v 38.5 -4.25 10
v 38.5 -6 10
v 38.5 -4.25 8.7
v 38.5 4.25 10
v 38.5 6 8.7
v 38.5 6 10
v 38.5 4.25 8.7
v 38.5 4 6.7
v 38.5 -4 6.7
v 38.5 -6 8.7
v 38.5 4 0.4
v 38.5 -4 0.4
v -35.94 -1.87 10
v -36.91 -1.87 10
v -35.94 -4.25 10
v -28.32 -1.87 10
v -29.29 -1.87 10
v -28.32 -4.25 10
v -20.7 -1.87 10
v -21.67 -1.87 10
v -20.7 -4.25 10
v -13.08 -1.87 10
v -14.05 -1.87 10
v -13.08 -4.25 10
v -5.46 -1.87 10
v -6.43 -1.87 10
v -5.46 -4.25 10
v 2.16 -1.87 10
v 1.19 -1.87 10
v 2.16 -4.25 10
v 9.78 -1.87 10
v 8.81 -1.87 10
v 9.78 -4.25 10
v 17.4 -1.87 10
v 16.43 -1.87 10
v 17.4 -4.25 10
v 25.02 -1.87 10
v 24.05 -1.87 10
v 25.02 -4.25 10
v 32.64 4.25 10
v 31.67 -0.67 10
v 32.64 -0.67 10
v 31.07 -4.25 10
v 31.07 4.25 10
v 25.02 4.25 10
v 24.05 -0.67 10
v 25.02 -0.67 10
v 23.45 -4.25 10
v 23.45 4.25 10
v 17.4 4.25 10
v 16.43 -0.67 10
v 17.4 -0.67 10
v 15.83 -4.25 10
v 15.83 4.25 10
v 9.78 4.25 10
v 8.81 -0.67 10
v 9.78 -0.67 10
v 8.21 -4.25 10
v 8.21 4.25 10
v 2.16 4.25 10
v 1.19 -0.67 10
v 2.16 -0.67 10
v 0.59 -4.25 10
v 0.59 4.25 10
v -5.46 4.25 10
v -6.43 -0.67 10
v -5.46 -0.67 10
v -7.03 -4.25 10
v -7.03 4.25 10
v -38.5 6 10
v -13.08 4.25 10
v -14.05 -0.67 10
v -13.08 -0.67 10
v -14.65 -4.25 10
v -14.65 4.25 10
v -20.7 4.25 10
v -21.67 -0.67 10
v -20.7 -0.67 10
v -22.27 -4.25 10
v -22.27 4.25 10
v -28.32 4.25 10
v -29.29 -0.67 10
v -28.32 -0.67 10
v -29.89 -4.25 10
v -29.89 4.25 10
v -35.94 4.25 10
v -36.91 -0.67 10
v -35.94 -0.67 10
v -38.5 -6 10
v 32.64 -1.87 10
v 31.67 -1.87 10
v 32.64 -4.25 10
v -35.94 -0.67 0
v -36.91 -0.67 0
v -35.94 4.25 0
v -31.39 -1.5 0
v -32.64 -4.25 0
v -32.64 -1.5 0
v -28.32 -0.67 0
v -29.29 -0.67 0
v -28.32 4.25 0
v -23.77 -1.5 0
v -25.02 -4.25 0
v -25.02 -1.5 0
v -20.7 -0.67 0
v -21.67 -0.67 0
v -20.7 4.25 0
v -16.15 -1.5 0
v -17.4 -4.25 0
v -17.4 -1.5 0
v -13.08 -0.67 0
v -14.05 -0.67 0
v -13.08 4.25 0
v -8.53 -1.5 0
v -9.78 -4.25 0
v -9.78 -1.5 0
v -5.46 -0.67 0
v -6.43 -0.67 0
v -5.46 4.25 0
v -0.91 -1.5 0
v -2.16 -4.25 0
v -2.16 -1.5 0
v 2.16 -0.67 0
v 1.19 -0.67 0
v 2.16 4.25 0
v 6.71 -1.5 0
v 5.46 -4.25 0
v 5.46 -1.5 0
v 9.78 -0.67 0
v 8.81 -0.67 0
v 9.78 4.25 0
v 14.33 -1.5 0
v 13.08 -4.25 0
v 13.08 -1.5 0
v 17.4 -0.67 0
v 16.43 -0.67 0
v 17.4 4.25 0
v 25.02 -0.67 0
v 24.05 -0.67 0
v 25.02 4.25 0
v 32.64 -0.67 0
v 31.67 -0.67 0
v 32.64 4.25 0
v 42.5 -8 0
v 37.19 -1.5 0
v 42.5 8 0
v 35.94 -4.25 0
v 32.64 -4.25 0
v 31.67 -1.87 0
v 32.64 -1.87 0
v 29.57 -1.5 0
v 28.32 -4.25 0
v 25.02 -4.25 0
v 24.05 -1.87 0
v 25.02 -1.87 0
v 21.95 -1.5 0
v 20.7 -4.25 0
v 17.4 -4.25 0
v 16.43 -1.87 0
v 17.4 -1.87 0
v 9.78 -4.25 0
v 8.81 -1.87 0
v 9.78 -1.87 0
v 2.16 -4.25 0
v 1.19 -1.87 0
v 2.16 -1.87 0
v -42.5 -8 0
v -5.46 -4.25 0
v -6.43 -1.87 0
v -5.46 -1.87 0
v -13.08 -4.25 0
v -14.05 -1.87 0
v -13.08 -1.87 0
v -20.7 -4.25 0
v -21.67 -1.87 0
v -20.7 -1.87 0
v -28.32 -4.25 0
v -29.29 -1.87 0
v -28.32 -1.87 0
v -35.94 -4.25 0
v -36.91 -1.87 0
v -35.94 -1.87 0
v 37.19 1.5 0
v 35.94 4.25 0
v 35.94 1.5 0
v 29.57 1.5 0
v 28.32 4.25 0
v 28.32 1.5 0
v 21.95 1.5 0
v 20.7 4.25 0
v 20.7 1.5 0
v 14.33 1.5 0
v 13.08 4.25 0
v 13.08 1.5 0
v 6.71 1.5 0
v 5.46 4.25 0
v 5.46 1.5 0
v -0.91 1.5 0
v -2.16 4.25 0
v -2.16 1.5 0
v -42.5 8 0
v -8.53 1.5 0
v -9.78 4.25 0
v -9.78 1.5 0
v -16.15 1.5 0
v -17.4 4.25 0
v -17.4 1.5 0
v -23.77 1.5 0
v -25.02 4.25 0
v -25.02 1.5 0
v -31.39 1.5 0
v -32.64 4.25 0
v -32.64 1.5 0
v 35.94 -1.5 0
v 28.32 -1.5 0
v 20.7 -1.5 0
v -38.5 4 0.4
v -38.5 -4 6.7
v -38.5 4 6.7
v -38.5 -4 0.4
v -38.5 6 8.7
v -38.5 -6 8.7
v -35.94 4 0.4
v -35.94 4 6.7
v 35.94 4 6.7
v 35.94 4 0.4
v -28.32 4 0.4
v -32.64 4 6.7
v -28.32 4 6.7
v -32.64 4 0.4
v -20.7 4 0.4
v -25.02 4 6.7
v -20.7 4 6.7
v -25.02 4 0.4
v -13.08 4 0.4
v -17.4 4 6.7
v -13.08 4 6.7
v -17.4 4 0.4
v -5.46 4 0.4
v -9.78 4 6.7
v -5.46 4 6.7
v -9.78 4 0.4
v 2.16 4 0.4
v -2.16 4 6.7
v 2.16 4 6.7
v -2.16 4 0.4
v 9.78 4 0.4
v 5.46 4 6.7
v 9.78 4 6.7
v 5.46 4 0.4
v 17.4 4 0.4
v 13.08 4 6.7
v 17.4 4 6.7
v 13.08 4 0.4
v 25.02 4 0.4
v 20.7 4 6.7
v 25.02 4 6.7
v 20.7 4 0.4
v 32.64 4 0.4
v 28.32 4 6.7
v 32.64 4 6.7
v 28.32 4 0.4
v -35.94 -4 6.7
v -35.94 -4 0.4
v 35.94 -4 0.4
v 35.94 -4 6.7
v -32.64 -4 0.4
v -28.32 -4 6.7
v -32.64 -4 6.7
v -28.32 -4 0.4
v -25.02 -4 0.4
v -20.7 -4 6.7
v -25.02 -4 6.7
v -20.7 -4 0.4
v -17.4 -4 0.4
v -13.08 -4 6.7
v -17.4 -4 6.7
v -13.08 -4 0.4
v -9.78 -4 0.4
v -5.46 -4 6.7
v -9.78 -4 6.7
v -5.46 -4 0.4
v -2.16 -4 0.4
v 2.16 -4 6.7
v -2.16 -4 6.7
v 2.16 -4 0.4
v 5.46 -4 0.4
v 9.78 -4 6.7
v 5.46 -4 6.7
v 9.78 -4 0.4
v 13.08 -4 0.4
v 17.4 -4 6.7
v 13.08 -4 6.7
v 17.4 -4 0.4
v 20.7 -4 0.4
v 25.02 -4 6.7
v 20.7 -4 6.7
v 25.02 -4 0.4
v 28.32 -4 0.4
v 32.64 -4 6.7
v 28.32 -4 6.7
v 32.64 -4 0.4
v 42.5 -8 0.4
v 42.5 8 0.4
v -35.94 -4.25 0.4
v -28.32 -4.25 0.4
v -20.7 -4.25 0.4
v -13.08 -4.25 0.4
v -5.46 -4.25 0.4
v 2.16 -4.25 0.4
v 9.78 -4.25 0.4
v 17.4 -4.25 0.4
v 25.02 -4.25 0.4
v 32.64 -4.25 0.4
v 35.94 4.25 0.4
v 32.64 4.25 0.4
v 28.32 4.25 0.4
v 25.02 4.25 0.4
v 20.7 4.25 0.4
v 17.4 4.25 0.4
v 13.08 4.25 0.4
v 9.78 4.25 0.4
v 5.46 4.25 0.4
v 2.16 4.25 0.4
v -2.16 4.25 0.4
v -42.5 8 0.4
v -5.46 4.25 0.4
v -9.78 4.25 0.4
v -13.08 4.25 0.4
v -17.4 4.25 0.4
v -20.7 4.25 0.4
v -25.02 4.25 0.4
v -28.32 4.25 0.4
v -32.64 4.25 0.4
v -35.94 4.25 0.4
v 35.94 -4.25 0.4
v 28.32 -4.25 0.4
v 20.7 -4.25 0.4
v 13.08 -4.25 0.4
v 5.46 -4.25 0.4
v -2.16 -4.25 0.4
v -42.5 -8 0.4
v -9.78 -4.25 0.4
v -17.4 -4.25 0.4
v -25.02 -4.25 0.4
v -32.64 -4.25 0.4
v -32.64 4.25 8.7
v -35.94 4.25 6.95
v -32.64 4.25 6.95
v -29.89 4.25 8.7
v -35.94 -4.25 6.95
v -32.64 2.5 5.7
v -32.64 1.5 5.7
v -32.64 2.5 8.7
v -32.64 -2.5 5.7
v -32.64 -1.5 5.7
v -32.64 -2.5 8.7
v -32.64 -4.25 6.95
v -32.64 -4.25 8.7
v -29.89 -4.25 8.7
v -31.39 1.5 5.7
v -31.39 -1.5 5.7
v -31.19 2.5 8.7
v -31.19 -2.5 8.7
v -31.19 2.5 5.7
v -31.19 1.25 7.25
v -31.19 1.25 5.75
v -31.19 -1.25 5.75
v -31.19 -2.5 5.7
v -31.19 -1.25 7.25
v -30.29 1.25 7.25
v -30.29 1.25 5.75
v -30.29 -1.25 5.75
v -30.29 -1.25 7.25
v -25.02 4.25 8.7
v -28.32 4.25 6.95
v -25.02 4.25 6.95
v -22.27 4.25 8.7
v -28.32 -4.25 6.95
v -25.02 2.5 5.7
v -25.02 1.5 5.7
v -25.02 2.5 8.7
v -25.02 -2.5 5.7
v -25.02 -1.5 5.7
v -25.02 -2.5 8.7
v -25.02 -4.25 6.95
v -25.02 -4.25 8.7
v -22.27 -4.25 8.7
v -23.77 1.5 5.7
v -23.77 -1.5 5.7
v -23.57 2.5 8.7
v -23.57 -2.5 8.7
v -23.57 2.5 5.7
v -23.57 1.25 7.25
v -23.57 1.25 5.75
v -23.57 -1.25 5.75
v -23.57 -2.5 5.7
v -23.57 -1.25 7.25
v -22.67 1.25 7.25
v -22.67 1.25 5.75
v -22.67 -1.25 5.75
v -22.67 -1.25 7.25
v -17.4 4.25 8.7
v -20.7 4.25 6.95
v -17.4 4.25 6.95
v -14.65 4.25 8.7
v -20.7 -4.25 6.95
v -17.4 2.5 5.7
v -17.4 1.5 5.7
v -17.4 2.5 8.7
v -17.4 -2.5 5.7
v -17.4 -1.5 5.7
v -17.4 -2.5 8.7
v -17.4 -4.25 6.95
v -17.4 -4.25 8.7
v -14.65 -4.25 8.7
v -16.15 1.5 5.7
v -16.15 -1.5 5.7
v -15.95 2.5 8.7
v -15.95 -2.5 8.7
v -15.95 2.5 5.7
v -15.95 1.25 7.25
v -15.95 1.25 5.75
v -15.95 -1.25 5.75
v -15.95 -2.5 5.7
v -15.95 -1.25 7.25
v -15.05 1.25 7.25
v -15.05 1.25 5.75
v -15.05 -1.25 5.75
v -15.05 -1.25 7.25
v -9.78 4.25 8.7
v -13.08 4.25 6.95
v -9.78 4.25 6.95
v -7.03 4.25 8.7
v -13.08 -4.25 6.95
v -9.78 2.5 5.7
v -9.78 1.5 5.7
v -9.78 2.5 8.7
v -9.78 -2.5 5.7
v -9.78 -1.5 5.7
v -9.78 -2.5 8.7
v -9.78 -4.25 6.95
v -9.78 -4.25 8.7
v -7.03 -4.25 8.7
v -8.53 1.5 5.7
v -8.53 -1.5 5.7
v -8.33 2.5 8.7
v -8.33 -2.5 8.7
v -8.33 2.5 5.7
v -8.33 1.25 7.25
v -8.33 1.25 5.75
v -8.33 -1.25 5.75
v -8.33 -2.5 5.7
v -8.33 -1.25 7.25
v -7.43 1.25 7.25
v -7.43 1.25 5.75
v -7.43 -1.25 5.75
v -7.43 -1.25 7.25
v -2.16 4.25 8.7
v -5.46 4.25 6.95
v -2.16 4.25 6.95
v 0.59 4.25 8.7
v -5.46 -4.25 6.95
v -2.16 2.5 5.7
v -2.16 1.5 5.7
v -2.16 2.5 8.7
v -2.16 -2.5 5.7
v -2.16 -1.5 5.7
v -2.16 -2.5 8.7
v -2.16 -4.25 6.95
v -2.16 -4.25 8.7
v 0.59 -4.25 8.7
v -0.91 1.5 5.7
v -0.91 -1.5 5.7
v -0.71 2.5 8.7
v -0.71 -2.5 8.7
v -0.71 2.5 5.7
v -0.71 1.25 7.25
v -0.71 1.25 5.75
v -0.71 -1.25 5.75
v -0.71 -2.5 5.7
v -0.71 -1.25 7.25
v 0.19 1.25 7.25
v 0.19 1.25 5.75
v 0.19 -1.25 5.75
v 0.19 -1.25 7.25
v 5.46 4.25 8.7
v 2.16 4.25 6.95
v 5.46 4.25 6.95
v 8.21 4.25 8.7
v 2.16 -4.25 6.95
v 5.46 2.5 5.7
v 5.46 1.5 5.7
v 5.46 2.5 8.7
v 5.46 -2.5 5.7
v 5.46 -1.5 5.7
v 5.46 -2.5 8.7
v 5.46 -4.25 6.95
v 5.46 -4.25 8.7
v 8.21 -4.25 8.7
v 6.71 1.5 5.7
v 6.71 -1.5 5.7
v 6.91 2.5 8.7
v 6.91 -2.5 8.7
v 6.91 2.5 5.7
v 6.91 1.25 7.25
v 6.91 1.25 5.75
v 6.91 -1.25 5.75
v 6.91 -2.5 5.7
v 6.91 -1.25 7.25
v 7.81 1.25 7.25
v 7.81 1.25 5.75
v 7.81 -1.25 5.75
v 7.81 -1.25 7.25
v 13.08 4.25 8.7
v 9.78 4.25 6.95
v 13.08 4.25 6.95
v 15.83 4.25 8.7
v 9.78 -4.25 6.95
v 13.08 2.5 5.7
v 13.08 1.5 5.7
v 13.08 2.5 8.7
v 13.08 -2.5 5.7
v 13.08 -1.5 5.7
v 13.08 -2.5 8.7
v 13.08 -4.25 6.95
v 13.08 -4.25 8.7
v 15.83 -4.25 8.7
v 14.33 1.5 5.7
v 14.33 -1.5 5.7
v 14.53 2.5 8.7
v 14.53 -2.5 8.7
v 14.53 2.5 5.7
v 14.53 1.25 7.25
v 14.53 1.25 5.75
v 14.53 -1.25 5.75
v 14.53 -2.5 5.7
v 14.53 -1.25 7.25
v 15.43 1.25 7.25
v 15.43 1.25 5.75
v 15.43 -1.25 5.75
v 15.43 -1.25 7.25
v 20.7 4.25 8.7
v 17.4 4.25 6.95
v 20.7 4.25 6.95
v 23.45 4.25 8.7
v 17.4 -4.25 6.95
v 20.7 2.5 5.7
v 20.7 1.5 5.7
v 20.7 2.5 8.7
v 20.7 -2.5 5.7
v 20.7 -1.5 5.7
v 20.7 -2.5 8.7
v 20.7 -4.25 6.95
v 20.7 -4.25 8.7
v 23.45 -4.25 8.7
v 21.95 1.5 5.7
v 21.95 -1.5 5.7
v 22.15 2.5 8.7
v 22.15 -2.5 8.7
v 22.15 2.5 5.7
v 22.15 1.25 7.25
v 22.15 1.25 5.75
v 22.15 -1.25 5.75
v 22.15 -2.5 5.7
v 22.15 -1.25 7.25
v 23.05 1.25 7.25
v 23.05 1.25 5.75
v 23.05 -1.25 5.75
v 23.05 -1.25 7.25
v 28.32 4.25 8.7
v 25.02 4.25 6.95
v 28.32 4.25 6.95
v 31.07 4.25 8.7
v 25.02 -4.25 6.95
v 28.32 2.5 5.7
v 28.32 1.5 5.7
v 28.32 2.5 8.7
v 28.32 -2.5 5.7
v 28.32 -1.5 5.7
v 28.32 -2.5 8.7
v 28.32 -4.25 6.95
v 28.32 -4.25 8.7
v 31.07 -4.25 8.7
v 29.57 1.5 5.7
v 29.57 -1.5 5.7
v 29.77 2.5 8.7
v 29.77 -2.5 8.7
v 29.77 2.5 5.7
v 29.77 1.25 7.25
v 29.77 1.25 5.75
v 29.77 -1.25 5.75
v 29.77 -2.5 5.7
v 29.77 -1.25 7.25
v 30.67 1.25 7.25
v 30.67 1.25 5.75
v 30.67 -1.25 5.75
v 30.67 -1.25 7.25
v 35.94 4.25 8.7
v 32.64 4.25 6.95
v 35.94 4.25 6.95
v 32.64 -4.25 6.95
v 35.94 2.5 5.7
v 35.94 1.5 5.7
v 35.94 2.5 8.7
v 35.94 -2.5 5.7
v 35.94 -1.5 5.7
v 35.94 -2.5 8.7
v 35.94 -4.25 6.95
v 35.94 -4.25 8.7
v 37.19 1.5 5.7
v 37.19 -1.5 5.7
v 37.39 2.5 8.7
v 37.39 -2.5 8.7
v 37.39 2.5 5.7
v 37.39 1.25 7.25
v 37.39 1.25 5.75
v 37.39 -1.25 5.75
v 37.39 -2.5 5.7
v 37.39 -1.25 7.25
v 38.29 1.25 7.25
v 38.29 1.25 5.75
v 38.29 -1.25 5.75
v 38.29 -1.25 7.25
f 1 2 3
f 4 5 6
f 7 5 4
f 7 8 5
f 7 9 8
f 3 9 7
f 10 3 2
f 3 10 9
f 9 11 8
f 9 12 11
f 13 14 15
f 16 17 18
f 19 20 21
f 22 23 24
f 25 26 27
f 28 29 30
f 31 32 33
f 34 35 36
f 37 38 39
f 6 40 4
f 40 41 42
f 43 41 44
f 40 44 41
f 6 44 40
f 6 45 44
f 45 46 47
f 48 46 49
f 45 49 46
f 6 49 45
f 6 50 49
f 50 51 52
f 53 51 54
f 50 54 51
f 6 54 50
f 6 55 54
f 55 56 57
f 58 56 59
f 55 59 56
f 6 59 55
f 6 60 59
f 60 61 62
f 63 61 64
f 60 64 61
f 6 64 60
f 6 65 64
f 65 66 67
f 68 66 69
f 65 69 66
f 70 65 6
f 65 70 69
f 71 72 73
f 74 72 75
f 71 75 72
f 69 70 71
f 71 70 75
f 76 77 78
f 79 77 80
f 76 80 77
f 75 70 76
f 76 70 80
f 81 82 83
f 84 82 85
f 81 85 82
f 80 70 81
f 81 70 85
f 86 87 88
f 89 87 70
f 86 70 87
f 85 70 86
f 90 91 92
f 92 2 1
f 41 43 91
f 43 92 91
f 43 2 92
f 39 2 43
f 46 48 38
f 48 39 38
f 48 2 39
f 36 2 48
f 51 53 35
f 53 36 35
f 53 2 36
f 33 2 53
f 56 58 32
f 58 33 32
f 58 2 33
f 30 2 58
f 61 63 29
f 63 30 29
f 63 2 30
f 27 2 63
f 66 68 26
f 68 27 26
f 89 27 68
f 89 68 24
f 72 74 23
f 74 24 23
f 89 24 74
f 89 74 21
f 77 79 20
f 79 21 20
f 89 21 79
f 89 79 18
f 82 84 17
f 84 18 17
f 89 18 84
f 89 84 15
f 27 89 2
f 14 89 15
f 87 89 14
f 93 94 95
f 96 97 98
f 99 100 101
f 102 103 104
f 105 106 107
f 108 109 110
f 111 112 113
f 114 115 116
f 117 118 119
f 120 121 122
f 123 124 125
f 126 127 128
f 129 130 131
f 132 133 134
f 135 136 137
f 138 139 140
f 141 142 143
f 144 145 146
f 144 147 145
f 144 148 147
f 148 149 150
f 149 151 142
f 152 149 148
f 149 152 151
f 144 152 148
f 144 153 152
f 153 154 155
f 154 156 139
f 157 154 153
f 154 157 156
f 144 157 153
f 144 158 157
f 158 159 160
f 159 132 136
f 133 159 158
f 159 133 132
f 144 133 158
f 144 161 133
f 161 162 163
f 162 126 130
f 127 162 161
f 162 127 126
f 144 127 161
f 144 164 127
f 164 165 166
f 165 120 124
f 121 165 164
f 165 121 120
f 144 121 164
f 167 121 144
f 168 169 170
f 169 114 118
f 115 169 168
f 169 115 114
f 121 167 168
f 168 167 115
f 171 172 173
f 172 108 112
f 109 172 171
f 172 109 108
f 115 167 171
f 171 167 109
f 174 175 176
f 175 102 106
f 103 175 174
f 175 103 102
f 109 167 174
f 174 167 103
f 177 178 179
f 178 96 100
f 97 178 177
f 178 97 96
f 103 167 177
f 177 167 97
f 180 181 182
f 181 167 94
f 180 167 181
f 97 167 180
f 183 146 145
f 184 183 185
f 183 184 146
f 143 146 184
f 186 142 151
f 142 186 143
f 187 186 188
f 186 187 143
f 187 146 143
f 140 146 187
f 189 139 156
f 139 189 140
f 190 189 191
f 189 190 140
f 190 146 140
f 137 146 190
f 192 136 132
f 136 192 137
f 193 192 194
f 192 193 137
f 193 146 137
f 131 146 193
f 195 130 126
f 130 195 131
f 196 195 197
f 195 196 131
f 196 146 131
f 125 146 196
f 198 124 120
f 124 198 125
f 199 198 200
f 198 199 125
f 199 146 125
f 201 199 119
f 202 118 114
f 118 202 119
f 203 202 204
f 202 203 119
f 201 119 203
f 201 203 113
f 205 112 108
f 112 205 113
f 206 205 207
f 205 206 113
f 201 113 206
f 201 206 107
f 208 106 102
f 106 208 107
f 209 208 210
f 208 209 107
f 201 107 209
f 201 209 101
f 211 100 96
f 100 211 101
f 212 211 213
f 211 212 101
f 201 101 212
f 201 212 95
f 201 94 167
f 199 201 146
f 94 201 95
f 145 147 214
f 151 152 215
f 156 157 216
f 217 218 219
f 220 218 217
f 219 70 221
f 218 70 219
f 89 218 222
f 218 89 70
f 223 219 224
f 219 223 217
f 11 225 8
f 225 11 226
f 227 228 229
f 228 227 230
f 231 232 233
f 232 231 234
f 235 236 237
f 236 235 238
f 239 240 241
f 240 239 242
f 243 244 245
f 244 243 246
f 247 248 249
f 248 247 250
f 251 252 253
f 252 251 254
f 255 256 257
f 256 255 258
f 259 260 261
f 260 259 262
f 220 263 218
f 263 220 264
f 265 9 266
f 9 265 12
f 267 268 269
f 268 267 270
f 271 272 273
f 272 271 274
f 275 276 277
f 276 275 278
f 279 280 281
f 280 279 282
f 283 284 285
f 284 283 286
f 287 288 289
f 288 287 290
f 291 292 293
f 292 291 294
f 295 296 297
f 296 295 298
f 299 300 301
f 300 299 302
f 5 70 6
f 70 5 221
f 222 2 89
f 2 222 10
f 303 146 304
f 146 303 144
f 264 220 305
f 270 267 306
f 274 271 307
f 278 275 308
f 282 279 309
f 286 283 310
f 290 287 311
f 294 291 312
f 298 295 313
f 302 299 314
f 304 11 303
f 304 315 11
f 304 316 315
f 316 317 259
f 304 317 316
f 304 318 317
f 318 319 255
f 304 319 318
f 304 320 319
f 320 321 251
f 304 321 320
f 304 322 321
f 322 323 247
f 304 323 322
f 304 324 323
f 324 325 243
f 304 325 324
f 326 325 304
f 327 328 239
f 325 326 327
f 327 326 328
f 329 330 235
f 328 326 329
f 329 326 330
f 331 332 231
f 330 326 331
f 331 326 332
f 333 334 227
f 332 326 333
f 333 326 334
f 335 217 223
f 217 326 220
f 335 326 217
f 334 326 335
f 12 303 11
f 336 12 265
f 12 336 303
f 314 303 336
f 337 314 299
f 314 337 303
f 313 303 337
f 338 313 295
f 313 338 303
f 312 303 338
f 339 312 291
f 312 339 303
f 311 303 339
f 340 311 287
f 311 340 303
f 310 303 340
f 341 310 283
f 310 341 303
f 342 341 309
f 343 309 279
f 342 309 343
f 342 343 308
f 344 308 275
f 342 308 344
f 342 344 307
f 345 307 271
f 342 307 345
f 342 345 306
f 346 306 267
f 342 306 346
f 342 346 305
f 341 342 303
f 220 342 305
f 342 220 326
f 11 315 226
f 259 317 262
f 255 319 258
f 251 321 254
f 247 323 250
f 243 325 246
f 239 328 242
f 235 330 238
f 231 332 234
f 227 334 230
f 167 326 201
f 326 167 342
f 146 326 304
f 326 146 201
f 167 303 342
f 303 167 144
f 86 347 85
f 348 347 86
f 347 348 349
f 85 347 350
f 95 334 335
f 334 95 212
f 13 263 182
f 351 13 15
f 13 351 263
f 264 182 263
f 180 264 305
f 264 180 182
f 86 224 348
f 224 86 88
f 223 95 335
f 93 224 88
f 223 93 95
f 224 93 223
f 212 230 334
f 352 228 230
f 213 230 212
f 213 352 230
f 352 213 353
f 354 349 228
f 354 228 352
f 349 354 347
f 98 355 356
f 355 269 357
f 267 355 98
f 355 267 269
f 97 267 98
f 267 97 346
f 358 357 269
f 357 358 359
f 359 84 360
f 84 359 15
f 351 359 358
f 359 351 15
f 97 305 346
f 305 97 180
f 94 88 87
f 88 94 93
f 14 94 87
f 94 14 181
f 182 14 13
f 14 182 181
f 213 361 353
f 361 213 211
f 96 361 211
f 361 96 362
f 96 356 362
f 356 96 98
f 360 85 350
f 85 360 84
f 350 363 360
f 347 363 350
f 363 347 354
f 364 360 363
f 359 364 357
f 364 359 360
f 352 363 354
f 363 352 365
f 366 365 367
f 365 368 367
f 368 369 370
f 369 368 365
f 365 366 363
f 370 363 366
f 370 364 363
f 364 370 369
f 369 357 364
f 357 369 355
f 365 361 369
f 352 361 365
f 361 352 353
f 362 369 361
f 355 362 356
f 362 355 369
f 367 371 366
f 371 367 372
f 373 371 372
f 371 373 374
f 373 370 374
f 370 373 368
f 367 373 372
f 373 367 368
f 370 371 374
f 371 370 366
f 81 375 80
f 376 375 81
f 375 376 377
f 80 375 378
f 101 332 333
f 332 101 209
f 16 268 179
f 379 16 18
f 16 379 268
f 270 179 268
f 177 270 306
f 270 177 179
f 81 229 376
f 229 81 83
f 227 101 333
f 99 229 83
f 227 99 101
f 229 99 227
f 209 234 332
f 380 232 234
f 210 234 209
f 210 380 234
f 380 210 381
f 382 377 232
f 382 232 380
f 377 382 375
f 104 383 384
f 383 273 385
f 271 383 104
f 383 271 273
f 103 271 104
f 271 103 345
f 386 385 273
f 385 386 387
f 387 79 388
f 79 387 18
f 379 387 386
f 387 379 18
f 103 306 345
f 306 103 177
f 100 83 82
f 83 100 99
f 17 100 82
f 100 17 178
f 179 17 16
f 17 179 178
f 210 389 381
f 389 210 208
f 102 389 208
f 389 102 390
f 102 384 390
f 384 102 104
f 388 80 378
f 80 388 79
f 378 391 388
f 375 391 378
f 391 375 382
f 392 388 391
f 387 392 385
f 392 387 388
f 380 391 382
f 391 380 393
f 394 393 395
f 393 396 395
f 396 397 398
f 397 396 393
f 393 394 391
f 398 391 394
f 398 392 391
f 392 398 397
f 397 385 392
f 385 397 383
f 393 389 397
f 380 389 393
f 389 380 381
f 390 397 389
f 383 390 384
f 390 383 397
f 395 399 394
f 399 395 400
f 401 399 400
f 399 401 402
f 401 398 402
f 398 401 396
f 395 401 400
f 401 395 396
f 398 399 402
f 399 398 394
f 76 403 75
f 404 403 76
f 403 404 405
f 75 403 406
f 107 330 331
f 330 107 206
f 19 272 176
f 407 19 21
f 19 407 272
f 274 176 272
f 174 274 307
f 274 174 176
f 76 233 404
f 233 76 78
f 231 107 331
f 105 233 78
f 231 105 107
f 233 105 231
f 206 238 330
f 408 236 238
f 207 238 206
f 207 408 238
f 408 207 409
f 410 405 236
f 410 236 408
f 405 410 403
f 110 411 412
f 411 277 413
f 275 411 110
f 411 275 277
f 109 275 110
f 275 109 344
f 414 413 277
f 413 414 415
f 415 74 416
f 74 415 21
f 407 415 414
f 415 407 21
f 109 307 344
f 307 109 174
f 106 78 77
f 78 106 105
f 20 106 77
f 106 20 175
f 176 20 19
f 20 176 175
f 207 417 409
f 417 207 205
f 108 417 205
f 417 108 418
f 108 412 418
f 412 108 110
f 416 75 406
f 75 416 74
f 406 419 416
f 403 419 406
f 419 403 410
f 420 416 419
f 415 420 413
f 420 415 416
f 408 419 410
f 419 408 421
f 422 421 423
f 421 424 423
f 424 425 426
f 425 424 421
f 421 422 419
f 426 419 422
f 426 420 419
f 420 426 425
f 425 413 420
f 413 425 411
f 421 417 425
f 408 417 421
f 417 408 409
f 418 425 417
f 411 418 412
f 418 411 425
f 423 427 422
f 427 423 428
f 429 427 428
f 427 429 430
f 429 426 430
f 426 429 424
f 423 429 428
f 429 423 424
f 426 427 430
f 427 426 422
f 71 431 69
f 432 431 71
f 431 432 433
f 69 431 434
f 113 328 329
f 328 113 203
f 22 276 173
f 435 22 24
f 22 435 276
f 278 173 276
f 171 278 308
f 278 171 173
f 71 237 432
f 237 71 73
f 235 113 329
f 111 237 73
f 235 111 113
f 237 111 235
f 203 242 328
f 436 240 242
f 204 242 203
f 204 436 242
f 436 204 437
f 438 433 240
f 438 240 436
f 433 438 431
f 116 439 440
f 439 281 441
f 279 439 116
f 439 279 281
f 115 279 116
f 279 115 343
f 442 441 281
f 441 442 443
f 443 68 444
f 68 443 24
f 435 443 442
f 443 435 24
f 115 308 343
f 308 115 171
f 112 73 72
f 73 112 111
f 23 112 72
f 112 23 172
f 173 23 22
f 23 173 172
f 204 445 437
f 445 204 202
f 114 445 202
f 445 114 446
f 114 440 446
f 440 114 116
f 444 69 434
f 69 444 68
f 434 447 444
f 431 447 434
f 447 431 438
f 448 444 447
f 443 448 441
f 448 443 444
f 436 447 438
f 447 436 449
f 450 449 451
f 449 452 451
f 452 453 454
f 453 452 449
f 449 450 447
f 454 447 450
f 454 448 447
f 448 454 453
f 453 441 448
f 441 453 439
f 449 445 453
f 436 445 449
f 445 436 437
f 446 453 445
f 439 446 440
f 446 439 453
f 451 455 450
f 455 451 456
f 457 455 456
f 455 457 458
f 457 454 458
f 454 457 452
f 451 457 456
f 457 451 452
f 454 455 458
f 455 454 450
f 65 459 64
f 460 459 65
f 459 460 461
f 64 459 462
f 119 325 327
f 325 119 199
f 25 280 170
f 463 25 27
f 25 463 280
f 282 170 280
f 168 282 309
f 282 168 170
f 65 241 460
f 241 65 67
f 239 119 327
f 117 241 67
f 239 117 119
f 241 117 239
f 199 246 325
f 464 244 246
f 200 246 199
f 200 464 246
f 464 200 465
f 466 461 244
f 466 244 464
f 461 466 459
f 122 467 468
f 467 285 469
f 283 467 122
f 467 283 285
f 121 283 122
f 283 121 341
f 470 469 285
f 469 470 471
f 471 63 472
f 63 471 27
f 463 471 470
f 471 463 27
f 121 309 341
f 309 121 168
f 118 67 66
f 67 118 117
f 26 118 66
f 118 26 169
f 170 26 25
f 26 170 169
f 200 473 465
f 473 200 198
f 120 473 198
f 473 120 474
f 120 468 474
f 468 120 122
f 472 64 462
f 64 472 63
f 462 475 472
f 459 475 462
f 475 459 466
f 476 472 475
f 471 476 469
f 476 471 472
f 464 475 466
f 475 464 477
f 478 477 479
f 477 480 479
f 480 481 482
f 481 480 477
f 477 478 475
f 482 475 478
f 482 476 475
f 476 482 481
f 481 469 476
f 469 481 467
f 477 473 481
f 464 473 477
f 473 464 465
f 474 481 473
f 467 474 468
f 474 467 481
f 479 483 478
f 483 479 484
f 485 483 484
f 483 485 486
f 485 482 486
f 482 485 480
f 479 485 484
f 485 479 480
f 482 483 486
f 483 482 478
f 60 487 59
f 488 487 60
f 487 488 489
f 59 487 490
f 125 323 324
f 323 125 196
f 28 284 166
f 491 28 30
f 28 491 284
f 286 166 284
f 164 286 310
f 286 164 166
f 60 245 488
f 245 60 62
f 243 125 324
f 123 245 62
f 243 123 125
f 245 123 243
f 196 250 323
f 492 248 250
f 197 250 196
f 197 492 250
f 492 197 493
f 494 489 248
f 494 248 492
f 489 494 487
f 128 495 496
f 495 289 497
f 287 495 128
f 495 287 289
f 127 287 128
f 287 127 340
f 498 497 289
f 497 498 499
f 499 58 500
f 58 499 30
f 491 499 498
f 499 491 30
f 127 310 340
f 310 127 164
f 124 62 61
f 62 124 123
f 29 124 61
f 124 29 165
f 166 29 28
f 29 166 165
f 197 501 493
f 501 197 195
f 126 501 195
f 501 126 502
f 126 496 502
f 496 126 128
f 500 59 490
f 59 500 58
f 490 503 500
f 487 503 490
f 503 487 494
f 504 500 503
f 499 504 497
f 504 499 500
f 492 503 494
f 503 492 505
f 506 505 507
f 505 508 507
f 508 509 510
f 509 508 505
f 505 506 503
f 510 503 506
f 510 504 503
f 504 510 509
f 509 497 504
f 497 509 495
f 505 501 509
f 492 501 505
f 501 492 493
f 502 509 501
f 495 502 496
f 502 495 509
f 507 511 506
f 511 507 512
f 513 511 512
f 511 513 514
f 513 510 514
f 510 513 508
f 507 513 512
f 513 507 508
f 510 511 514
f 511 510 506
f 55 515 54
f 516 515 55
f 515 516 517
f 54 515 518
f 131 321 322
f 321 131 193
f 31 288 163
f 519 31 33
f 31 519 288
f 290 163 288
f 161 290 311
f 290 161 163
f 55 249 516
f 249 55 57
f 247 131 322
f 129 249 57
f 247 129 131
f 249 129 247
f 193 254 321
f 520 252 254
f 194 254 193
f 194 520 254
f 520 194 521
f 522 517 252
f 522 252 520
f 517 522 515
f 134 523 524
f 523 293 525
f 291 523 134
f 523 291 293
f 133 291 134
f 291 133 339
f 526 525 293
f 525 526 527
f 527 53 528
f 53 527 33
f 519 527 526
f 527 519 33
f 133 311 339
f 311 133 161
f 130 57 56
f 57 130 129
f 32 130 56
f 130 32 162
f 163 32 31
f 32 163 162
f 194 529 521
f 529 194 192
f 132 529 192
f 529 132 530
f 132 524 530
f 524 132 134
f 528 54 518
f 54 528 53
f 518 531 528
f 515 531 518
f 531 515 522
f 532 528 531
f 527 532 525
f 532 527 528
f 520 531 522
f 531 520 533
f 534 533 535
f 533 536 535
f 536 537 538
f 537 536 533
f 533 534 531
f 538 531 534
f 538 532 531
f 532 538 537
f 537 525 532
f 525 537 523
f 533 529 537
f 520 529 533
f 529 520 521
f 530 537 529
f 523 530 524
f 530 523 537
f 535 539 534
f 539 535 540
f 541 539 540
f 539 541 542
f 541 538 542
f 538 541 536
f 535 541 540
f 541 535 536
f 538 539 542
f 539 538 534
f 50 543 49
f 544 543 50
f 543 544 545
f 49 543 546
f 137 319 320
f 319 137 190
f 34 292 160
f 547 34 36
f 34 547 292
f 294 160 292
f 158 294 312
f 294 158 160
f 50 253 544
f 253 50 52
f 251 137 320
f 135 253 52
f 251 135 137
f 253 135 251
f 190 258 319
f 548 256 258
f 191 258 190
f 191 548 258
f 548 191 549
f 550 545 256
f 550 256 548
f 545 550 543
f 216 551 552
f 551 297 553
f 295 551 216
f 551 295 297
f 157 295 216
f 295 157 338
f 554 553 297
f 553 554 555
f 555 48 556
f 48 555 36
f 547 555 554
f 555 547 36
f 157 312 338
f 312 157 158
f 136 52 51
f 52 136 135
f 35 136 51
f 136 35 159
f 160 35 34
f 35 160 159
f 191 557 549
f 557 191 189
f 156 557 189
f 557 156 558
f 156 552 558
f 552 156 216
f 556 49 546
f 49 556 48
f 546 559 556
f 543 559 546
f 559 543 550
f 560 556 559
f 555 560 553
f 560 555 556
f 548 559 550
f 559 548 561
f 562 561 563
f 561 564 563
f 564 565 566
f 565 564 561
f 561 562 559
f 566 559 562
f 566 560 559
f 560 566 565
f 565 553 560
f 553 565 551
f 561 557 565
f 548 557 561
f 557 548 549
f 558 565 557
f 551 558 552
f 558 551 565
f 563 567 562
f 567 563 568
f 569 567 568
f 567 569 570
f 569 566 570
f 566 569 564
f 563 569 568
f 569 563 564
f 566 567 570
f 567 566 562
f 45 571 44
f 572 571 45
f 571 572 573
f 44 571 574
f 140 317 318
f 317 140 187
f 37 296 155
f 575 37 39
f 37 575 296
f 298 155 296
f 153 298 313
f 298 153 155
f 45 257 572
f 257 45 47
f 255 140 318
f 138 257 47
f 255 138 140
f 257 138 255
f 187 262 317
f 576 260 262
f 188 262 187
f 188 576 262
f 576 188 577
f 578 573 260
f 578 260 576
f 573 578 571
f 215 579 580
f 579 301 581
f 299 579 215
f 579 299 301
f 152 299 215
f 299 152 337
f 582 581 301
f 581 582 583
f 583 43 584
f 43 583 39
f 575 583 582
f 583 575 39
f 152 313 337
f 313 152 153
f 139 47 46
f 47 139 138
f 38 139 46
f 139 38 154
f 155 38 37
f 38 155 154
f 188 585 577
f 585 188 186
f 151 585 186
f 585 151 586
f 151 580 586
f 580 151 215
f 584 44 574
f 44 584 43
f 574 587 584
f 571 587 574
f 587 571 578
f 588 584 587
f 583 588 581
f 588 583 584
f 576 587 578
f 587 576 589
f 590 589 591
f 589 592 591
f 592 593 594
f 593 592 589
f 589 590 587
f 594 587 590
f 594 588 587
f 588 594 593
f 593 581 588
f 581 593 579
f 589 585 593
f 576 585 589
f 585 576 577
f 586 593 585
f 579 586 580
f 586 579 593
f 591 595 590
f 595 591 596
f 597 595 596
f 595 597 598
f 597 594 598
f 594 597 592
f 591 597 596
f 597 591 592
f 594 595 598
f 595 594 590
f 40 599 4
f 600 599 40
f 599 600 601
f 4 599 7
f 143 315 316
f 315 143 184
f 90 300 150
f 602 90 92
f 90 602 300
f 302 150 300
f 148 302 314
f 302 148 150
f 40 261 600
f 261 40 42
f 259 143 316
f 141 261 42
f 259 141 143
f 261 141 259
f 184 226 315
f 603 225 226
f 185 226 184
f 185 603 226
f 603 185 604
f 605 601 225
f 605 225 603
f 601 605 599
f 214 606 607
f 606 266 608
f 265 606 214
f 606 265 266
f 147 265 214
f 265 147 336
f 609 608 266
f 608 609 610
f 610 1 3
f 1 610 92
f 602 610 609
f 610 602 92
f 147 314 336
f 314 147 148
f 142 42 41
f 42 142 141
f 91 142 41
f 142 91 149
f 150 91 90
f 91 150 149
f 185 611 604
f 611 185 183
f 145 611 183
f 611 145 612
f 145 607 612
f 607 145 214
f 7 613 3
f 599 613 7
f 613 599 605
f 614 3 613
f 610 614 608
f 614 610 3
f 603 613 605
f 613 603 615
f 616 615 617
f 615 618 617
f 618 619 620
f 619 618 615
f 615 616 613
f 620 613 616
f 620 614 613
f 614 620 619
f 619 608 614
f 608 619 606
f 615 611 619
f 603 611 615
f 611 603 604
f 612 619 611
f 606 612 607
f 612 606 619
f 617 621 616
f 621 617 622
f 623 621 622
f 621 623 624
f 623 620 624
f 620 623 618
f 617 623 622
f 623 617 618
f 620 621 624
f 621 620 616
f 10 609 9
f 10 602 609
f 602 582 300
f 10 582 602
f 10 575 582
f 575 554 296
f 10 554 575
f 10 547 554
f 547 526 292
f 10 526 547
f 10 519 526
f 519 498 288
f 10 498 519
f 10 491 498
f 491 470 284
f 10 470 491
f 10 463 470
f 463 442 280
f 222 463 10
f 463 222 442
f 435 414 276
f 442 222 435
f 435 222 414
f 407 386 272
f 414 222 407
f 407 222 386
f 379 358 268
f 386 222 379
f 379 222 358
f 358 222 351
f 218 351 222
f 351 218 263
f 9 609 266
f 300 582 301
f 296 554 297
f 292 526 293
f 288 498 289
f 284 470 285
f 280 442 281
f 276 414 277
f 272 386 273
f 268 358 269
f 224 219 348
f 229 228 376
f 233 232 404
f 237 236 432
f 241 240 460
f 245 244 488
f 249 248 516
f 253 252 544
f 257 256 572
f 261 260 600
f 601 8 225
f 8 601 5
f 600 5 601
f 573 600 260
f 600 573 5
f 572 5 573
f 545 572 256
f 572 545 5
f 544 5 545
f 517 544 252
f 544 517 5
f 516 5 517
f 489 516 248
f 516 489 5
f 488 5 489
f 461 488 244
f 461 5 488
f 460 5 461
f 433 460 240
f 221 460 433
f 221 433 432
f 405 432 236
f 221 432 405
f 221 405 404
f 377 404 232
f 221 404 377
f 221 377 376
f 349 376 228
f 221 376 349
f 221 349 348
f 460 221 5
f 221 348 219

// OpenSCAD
sample();

module sample(){
    difference(){
        union(){
            translate([0,0,10/2])
            cube([77, 8, 10],center=true);
            translate([0,0,10-3.3/2])
            cube([77,12, 3.3],center=true);
            translate([0,0,.2])
            cube([85,16,.4],center=true);
        }
        for(x = [0:1:9]){
            translate([-5*7.62+7.62/2+x*7.62,0,7.7])
            rotate([-90,0,90])
            3pin();
        }
        for(y = [-6,6]){
            translate([0,y,10-3.3])
            rotate([45,0,0])
            #cube([80,sqrt(2*(12-8)),sqrt(2*(12-8))],center=true);
        }
    }
}

module roborioright(){
    
}

//translate([25,0,0])
//3pin();


module 3pin(){
    //scale(25.4)
    //import("D:\\Downloads\\Molex-CGrid-SL-3\\050579403_fixed.stl", convexity=10);
    cube([8.5,20,3.3],center=true);
    translate([-2.54/2,0,(2.54+1.2)/2])
    cube([1.2, 20, 1.5], center=true);
    translate([0,0,-1.4])
    cube([3, 20, 3], center=true);
    translate([0,-5.5, -2.8])
    cube([8.5,9,3.2], center=true);
    translate([0,-0,-2.1])
    cube([5,4,2], center=true);
    translate([0,1.2,-2])
    cube([2.5,1.5,4],center=true);
}
